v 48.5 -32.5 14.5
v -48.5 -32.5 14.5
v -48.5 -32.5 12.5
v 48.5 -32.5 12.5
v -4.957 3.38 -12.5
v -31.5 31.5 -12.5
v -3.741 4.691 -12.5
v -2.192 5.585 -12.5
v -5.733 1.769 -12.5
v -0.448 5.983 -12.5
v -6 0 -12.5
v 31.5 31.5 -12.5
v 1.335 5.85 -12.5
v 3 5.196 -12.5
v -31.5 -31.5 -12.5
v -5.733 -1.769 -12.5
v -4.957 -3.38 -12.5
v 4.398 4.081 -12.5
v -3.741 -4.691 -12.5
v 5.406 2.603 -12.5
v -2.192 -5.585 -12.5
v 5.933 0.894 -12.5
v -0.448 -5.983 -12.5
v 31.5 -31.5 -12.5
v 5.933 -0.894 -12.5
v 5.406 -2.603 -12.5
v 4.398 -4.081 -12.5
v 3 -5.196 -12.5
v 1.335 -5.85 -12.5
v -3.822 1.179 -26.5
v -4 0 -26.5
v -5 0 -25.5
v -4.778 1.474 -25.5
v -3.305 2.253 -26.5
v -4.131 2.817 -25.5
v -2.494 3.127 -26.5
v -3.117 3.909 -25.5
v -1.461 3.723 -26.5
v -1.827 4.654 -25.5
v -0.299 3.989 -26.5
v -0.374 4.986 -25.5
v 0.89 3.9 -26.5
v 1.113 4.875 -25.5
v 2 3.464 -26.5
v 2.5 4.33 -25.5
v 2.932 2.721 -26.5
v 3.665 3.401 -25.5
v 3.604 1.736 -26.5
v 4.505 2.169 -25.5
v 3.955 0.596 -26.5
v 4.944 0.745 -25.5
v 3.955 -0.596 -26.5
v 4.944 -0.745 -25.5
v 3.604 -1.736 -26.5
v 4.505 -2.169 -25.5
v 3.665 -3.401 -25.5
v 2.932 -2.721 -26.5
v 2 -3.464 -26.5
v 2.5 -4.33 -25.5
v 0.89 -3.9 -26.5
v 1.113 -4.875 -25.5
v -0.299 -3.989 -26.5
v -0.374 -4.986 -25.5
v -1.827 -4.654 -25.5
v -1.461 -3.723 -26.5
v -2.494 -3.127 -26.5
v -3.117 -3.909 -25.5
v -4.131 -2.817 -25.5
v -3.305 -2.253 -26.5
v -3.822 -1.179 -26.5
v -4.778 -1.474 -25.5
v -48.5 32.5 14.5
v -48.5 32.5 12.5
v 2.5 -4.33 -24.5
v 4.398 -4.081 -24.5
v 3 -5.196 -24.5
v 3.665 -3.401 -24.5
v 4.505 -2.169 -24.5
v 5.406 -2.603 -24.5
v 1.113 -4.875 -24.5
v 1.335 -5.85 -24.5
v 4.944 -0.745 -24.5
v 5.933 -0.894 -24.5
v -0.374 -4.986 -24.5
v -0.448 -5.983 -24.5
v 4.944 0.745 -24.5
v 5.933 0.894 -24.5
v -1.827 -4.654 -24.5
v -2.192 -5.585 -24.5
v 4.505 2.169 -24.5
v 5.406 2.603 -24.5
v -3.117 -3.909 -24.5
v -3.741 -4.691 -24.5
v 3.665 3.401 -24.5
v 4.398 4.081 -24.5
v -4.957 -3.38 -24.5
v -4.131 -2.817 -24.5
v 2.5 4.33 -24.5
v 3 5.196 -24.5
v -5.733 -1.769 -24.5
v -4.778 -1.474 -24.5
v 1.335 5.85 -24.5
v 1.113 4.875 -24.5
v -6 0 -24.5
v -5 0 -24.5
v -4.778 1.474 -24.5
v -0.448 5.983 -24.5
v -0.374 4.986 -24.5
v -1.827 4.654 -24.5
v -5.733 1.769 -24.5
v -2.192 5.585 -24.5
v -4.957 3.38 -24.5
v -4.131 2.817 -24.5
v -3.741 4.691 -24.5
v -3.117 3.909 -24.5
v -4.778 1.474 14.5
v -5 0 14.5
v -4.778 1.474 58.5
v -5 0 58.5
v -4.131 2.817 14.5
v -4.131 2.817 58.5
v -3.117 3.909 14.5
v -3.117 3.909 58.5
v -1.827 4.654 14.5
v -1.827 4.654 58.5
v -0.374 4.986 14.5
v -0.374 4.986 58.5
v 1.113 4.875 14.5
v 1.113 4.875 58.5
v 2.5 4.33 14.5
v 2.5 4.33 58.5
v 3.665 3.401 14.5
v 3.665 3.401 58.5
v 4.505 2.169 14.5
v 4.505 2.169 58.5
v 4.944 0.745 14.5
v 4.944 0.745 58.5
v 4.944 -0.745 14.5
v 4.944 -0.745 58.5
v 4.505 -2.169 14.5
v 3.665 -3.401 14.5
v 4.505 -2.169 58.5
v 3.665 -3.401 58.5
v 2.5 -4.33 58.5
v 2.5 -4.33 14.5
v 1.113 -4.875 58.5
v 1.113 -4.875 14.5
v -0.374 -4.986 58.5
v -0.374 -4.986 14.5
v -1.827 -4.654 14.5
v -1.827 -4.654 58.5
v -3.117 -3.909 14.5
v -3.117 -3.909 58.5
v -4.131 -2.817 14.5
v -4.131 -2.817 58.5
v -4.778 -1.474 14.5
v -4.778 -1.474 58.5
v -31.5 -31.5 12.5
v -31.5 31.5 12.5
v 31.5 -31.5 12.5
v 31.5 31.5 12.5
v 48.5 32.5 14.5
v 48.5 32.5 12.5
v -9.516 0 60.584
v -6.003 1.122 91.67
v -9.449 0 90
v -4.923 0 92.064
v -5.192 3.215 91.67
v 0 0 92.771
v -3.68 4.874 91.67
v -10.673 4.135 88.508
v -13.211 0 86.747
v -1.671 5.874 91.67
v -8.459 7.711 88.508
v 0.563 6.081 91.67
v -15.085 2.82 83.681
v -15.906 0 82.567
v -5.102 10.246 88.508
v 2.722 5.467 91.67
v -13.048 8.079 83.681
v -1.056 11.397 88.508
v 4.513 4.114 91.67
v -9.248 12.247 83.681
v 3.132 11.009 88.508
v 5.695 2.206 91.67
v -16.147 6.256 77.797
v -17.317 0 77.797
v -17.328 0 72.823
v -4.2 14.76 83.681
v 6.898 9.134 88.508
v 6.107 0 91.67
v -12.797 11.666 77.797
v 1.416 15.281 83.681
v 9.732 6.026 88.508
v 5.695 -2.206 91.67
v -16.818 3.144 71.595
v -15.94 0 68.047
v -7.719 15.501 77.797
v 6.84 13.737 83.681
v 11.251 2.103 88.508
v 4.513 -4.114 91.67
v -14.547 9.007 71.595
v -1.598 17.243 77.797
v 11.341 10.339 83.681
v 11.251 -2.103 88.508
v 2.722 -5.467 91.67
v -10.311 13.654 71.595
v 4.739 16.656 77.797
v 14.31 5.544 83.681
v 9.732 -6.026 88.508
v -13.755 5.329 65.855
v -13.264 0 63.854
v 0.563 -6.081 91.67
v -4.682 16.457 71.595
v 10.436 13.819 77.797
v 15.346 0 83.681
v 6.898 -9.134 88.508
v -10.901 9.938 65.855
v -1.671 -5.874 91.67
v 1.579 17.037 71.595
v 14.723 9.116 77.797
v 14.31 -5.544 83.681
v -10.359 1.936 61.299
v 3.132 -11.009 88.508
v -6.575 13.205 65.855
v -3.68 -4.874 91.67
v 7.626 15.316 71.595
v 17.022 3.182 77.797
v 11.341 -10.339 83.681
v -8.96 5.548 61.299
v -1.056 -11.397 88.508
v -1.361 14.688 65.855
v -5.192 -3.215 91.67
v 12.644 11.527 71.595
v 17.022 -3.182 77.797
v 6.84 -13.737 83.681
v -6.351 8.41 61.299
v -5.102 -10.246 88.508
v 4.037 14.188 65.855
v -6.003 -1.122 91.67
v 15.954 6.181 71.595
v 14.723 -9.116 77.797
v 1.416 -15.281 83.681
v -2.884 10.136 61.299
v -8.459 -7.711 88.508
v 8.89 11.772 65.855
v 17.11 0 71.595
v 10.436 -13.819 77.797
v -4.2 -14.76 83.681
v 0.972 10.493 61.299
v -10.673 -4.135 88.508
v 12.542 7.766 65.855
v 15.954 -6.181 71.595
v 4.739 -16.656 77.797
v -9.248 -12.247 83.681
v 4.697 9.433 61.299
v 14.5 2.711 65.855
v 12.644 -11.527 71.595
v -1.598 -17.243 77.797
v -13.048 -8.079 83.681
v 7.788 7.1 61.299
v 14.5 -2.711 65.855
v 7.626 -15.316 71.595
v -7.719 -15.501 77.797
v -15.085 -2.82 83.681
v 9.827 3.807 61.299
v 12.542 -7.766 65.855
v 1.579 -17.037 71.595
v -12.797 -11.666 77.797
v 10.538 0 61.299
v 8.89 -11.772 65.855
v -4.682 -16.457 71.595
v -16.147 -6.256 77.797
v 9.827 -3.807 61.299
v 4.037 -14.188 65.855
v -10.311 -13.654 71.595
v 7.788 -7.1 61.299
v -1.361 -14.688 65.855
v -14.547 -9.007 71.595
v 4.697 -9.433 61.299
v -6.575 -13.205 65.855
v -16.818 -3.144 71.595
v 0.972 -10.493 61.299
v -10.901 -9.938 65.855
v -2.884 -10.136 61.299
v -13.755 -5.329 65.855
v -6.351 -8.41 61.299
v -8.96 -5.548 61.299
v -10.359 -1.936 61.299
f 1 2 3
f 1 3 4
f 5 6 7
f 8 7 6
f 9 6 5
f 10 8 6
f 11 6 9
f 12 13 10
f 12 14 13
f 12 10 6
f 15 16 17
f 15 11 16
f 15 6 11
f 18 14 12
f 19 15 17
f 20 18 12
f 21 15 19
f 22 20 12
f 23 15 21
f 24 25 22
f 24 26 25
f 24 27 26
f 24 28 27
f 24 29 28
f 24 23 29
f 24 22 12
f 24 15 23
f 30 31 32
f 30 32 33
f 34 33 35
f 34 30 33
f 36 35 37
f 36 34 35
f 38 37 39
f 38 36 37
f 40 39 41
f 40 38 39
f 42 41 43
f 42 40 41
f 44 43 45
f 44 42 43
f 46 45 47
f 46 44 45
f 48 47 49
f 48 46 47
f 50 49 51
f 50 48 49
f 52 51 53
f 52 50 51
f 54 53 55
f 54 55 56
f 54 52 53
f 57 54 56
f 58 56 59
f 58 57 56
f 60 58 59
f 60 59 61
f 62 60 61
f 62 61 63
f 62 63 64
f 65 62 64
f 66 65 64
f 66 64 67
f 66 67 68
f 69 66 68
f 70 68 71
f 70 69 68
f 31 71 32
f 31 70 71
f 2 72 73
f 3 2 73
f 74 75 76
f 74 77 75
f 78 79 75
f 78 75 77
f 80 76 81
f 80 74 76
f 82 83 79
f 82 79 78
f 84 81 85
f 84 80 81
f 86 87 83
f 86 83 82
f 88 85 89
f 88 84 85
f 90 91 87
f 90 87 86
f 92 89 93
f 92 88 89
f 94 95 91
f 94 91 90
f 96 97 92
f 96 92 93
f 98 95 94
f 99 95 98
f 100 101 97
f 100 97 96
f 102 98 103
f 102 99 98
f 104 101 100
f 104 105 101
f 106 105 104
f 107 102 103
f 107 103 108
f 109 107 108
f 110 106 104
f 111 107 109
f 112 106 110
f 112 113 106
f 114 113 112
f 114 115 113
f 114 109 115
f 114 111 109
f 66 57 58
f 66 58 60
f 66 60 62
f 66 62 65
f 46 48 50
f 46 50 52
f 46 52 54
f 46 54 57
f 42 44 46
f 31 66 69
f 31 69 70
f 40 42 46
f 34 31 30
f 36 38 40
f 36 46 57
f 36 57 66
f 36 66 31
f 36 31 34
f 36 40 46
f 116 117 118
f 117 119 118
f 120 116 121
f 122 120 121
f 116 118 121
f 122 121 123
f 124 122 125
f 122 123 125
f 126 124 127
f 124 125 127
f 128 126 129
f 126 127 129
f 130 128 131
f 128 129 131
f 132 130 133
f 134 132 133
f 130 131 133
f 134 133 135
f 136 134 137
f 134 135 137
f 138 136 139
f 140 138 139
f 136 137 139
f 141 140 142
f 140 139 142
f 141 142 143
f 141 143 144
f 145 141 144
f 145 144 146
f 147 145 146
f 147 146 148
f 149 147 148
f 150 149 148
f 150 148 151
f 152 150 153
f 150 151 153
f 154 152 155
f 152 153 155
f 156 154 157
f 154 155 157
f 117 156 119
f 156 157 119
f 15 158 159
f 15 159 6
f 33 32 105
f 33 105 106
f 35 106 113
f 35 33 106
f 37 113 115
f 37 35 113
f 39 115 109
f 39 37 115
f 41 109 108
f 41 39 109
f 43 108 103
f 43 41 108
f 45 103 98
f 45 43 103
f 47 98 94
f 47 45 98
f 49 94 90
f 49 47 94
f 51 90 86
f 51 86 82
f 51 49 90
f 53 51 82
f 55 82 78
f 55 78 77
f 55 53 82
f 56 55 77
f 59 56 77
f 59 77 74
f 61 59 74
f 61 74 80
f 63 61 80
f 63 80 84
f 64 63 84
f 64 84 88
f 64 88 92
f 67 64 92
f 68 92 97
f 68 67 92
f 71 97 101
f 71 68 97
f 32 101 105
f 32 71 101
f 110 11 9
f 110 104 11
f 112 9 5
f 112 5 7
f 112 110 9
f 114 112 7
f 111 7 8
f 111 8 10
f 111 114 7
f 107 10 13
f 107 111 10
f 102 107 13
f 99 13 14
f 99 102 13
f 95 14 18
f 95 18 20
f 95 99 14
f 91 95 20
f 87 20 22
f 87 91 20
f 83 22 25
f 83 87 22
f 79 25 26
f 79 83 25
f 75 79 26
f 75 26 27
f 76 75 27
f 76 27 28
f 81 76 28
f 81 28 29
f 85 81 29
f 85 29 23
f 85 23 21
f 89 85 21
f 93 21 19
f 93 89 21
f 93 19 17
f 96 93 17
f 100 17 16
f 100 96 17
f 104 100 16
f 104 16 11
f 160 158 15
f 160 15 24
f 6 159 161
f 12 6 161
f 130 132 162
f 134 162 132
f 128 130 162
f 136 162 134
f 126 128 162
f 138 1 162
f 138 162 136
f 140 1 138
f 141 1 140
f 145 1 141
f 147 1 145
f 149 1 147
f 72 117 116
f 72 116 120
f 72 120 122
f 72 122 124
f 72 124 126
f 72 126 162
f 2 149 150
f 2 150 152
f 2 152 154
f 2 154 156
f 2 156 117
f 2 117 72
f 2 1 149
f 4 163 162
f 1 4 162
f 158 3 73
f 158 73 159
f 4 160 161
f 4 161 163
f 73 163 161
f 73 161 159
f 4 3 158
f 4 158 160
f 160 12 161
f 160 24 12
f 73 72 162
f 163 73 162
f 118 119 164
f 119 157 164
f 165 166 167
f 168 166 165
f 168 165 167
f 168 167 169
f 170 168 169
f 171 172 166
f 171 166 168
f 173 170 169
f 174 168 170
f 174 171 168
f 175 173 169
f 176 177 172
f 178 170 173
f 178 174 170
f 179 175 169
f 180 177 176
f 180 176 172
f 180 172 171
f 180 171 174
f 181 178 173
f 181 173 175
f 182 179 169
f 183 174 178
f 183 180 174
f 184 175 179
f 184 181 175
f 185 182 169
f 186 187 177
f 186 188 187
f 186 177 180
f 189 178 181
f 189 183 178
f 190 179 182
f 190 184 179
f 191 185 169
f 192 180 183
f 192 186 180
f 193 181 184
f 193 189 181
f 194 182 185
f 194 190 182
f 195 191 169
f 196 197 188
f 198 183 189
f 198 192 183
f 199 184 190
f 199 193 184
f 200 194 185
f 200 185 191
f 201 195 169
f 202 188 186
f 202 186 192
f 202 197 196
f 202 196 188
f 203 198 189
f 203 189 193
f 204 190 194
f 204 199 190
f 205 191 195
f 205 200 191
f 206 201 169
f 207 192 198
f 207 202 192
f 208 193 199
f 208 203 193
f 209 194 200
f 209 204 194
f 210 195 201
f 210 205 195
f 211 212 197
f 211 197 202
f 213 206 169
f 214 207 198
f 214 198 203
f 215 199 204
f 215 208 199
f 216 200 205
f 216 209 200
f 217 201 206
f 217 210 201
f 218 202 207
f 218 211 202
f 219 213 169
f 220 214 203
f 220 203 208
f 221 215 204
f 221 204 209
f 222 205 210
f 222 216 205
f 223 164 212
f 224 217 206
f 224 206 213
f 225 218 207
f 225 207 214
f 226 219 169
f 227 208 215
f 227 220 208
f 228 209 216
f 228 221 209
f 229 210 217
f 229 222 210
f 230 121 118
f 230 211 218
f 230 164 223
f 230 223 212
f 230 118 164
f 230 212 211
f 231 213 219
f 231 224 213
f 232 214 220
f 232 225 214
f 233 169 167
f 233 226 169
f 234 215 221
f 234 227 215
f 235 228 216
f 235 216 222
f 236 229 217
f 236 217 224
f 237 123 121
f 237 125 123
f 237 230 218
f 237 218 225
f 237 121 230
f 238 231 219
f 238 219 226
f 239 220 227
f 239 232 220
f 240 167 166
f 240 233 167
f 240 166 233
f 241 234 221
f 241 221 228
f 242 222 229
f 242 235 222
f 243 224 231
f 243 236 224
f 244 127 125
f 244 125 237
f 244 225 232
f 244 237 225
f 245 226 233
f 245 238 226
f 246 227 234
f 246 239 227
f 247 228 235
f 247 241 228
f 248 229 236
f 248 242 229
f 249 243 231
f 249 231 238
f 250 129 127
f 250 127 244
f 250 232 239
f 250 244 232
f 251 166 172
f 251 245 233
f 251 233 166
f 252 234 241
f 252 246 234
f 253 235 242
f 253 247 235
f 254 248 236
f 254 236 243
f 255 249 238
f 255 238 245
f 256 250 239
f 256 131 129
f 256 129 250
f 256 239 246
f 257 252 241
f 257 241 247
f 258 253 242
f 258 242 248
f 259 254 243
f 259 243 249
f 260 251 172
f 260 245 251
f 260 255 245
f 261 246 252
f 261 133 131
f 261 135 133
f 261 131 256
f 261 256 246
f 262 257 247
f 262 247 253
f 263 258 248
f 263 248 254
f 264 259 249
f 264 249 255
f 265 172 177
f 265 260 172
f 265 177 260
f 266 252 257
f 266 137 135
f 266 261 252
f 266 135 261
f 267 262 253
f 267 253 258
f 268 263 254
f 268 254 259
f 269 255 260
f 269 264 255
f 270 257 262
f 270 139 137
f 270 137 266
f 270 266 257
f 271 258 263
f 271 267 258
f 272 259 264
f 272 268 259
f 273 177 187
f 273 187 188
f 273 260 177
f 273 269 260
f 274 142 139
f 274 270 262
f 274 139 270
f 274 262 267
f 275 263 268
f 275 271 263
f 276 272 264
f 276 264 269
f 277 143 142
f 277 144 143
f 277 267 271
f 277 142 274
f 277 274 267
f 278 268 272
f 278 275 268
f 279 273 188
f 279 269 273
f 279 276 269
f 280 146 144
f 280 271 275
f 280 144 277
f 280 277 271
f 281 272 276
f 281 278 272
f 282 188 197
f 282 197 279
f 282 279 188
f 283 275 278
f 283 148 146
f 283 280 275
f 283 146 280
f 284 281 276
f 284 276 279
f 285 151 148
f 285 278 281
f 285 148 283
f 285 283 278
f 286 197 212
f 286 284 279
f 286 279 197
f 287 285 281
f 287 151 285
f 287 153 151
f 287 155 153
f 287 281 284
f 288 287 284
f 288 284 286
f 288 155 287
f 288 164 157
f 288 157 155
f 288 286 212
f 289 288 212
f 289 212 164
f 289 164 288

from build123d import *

# Parameters (mm, degrees)
F0_W     = 5
F0_H     = 44
F2_SIZE  = 1
F3_DEPTH = 32.5
F4_DEPTH = 31.5


with BuildPart() as f1:
    # F0 (on Front) → F1 (revolve)
    with BuildSketch(Plane.XZ):
        with Locations((-2.5, 36.5)):
            Rectangle(F0_W, F0_H)
        with BuildLine():
            Line((-5, 58.5), (0, 58.5))
            Line((0, 58.5), (0, 92.7705098312))
            ThreePointArc((0, 92.7705098312), (-17.3166671454, 77.7969775189), (-5, 58.5))
        make_face()
    revolve(axis=Axis((0, 0, 75.6352549156), (0, 0, -1)))

    # F0 (on Front) → F3 (join, symmetric)
    with BuildSketch(Plane.XZ):
        Polygon((-31.5, 12.5), (31.5, 12.5), (48.5, 12.5), (48.5, 14.5), (0, 14.5), (-5, 14.5), (-48.5, 14.5), (-48.5, 12.5), align=None)
    extrude(amount=F3_DEPTH, both=True)



with BuildPart() as f1b:
    # F0 (on Front) → F1, piece 2 (revolve)
    with BuildSketch(Plane.XZ):
        Polygon((0, -26.5), (0, -12.5), (-6, -12.5), (-6, -24.5), (-5, -24.5), (-5, -26.5), align=None)
    revolve(axis=Axis((0, 0, 75.6352549156), (0, 0, -1)))

    # F2
    f2_edges = [f1b.edges().sort_by_distance(p)[0] for p in [
        (5, 0, -26.5),
    ]]
    chamfer(f2_edges, length=F2_SIZE)


with BuildPart() as f1_1:
    add(f1.part)

    add(f1b.part)  # F4 merges F1b
    # F0 (on Front) → F4 (join, symmetric)
    with BuildSketch(Plane.XZ):
        Polygon((0, -12.5), (31.5, -12.5), (31.5, 12.5), (-31.5, 12.5), (-31.5, -12.5), (-6, -12.5), align=None)
    extrude(amount=F4_DEPTH, both=True)


solid = f1_1.part
